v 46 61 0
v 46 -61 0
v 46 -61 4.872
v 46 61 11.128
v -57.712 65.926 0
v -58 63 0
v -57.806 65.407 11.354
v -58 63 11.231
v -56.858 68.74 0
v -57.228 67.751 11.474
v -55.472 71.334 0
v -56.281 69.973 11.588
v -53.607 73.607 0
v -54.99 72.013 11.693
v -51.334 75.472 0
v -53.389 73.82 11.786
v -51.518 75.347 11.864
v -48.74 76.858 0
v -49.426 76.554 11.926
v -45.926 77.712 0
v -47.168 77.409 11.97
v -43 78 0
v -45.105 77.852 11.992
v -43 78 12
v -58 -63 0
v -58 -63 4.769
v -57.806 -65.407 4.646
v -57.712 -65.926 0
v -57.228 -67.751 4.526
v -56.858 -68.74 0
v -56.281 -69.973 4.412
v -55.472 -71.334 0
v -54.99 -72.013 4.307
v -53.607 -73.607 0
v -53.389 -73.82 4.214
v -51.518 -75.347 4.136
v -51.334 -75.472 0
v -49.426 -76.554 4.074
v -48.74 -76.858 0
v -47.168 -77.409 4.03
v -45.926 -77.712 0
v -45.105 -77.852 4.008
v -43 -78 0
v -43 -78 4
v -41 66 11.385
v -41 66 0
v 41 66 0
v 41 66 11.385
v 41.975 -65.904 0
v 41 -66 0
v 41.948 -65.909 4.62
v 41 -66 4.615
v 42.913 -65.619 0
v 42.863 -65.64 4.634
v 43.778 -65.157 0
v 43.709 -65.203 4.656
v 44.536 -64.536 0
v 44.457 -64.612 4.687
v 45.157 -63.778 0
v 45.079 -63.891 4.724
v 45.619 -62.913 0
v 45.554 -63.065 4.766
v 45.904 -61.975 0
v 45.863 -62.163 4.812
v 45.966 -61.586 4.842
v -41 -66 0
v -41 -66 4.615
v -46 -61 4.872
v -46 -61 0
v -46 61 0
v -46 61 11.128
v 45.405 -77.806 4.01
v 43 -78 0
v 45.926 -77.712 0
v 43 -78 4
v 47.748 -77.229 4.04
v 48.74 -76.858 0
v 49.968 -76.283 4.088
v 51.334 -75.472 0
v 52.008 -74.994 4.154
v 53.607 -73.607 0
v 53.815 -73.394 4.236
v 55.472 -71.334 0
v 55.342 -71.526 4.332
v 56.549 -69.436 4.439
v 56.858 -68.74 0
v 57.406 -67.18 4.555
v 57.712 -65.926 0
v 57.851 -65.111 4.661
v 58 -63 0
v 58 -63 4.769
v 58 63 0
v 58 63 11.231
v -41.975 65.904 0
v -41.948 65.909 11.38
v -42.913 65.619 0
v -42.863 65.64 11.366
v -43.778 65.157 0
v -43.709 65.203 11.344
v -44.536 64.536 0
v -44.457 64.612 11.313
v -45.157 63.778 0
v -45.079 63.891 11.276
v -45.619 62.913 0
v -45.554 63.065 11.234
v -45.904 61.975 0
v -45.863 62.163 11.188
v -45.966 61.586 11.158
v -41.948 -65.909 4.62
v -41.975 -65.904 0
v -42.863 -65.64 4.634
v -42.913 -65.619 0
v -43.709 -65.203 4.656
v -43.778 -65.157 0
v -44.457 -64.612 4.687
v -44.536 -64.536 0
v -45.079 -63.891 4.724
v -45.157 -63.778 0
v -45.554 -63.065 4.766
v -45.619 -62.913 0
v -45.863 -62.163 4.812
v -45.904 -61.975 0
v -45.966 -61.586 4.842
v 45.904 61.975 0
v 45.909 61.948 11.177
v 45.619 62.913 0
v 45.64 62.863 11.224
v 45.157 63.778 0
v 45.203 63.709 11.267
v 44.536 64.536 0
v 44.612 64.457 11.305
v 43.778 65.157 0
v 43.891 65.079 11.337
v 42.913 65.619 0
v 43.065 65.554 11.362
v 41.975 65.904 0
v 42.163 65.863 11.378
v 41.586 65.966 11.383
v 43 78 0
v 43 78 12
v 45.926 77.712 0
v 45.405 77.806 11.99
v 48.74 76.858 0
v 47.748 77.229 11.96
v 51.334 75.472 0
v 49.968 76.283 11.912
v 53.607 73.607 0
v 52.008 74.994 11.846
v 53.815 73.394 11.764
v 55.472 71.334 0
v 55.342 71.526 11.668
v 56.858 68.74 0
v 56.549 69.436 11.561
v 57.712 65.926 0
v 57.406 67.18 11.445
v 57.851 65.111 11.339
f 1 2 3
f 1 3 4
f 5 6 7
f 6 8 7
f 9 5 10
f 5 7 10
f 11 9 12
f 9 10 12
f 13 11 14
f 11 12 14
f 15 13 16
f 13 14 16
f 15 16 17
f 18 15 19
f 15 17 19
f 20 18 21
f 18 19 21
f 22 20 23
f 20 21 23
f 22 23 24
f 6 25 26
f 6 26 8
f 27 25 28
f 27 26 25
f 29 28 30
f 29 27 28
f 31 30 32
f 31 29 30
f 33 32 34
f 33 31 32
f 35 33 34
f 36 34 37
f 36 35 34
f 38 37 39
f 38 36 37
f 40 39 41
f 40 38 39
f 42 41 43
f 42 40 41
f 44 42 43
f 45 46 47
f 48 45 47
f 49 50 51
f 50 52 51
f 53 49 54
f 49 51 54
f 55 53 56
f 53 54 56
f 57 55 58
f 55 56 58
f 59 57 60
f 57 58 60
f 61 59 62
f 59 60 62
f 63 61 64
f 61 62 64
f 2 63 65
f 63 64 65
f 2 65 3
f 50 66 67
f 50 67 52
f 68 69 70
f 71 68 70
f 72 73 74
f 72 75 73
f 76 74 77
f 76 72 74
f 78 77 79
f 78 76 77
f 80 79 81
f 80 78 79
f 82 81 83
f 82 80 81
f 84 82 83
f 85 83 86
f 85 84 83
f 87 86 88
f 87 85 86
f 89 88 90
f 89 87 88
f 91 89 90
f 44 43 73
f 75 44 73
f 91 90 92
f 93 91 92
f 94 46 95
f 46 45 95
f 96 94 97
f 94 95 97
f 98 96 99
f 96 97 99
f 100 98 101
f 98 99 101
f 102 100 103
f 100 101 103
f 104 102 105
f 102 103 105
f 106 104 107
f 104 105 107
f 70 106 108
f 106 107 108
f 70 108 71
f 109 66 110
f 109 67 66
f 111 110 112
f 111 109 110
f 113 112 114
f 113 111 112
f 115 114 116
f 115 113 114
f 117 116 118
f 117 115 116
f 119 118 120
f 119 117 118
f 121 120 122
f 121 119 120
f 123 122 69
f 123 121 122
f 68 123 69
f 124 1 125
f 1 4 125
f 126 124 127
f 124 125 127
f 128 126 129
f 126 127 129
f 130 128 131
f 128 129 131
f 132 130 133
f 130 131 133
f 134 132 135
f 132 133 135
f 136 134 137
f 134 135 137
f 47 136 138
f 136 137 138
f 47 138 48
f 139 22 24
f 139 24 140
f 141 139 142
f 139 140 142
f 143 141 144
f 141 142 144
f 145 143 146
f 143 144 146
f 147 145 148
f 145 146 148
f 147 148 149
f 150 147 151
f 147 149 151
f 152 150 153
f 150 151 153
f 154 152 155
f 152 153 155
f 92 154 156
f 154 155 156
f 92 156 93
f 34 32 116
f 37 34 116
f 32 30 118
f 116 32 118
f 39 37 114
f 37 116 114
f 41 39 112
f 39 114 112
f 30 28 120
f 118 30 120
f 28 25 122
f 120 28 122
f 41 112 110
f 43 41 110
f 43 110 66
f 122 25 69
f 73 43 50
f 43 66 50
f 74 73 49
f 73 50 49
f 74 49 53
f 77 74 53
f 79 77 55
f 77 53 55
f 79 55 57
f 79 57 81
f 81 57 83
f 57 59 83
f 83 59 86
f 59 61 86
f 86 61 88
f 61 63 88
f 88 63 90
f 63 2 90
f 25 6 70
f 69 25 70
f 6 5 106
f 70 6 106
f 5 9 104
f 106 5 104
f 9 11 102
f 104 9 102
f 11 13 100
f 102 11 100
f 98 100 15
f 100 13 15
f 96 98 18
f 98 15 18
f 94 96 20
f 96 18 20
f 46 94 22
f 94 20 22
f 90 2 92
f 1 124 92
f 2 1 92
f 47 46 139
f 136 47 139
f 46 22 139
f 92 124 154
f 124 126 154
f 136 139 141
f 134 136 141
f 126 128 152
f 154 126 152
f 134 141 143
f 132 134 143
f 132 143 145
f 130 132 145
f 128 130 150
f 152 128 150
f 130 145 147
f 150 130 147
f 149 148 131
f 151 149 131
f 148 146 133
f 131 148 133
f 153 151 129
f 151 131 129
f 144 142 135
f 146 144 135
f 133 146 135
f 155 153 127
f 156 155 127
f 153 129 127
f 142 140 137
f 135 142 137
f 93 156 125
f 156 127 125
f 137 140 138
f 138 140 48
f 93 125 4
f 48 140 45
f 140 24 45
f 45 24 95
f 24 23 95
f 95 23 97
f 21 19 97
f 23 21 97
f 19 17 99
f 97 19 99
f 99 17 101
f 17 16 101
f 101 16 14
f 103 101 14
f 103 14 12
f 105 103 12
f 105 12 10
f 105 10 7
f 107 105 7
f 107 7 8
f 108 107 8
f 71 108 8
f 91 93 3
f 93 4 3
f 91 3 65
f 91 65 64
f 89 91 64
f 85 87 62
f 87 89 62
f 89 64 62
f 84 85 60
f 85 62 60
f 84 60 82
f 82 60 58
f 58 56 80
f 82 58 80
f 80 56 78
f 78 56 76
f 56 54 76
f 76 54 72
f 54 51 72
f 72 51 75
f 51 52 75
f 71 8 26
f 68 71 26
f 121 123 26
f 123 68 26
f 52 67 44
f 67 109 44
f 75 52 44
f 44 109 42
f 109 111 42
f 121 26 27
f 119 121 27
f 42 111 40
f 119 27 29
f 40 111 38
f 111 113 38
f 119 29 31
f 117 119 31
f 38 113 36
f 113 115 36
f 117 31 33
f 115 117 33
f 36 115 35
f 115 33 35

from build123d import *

# Parameters (mm, degrees)
F0_W     = 116
F0_H     = 156
F0_W_2   = 92
F0_H_2   = 132
F1_DEPTH = 12
F3_DEPTH = 116
F4_R     = 5
F5_R     = 15


with BuildPart() as f1:
    # F0 (on Top) → F1 (new body)
    with BuildSketch(Plane.XY):
        Rectangle(F0_W, F0_H)
        Rectangle(F0_W_2, F0_H_2, mode=Mode.SUBTRACT)
    extrude(amount=F1_DEPTH)

    # F2 (on face) → F3 (cut, through all)
    with BuildSketch(Plane(origin=(-58, 0, 0), x_dir=(0, -1, 0), z_dir=(-1, 0, 0))):
        Polygon((-78, 12), (78, 4), (78, 12), align=None)
    extrude(amount=-F3_DEPTH, mode=Mode.SUBTRACT)

    # F4
    f4_edges = [f1.edges().sort_by_distance(p)[0] for p in [
        (46, 66, 5.692308),
        (-46, 66, 5.692308),
        (-46, -66, 2.307692),
        (46, -66, 2.307692),
    ]]
    fillet(f4_edges, radius=F4_R)

    # F5
    f5_edges = [f1.edges().sort_by_distance(p)[0] for p in [
        (58, -78, 2),
        (-58, -78, 2),
        (-58, 78, 6),
        (58, 78, 6),
    ]]
    fillet(f5_edges, radius=F5_R)


solid = f1.part
